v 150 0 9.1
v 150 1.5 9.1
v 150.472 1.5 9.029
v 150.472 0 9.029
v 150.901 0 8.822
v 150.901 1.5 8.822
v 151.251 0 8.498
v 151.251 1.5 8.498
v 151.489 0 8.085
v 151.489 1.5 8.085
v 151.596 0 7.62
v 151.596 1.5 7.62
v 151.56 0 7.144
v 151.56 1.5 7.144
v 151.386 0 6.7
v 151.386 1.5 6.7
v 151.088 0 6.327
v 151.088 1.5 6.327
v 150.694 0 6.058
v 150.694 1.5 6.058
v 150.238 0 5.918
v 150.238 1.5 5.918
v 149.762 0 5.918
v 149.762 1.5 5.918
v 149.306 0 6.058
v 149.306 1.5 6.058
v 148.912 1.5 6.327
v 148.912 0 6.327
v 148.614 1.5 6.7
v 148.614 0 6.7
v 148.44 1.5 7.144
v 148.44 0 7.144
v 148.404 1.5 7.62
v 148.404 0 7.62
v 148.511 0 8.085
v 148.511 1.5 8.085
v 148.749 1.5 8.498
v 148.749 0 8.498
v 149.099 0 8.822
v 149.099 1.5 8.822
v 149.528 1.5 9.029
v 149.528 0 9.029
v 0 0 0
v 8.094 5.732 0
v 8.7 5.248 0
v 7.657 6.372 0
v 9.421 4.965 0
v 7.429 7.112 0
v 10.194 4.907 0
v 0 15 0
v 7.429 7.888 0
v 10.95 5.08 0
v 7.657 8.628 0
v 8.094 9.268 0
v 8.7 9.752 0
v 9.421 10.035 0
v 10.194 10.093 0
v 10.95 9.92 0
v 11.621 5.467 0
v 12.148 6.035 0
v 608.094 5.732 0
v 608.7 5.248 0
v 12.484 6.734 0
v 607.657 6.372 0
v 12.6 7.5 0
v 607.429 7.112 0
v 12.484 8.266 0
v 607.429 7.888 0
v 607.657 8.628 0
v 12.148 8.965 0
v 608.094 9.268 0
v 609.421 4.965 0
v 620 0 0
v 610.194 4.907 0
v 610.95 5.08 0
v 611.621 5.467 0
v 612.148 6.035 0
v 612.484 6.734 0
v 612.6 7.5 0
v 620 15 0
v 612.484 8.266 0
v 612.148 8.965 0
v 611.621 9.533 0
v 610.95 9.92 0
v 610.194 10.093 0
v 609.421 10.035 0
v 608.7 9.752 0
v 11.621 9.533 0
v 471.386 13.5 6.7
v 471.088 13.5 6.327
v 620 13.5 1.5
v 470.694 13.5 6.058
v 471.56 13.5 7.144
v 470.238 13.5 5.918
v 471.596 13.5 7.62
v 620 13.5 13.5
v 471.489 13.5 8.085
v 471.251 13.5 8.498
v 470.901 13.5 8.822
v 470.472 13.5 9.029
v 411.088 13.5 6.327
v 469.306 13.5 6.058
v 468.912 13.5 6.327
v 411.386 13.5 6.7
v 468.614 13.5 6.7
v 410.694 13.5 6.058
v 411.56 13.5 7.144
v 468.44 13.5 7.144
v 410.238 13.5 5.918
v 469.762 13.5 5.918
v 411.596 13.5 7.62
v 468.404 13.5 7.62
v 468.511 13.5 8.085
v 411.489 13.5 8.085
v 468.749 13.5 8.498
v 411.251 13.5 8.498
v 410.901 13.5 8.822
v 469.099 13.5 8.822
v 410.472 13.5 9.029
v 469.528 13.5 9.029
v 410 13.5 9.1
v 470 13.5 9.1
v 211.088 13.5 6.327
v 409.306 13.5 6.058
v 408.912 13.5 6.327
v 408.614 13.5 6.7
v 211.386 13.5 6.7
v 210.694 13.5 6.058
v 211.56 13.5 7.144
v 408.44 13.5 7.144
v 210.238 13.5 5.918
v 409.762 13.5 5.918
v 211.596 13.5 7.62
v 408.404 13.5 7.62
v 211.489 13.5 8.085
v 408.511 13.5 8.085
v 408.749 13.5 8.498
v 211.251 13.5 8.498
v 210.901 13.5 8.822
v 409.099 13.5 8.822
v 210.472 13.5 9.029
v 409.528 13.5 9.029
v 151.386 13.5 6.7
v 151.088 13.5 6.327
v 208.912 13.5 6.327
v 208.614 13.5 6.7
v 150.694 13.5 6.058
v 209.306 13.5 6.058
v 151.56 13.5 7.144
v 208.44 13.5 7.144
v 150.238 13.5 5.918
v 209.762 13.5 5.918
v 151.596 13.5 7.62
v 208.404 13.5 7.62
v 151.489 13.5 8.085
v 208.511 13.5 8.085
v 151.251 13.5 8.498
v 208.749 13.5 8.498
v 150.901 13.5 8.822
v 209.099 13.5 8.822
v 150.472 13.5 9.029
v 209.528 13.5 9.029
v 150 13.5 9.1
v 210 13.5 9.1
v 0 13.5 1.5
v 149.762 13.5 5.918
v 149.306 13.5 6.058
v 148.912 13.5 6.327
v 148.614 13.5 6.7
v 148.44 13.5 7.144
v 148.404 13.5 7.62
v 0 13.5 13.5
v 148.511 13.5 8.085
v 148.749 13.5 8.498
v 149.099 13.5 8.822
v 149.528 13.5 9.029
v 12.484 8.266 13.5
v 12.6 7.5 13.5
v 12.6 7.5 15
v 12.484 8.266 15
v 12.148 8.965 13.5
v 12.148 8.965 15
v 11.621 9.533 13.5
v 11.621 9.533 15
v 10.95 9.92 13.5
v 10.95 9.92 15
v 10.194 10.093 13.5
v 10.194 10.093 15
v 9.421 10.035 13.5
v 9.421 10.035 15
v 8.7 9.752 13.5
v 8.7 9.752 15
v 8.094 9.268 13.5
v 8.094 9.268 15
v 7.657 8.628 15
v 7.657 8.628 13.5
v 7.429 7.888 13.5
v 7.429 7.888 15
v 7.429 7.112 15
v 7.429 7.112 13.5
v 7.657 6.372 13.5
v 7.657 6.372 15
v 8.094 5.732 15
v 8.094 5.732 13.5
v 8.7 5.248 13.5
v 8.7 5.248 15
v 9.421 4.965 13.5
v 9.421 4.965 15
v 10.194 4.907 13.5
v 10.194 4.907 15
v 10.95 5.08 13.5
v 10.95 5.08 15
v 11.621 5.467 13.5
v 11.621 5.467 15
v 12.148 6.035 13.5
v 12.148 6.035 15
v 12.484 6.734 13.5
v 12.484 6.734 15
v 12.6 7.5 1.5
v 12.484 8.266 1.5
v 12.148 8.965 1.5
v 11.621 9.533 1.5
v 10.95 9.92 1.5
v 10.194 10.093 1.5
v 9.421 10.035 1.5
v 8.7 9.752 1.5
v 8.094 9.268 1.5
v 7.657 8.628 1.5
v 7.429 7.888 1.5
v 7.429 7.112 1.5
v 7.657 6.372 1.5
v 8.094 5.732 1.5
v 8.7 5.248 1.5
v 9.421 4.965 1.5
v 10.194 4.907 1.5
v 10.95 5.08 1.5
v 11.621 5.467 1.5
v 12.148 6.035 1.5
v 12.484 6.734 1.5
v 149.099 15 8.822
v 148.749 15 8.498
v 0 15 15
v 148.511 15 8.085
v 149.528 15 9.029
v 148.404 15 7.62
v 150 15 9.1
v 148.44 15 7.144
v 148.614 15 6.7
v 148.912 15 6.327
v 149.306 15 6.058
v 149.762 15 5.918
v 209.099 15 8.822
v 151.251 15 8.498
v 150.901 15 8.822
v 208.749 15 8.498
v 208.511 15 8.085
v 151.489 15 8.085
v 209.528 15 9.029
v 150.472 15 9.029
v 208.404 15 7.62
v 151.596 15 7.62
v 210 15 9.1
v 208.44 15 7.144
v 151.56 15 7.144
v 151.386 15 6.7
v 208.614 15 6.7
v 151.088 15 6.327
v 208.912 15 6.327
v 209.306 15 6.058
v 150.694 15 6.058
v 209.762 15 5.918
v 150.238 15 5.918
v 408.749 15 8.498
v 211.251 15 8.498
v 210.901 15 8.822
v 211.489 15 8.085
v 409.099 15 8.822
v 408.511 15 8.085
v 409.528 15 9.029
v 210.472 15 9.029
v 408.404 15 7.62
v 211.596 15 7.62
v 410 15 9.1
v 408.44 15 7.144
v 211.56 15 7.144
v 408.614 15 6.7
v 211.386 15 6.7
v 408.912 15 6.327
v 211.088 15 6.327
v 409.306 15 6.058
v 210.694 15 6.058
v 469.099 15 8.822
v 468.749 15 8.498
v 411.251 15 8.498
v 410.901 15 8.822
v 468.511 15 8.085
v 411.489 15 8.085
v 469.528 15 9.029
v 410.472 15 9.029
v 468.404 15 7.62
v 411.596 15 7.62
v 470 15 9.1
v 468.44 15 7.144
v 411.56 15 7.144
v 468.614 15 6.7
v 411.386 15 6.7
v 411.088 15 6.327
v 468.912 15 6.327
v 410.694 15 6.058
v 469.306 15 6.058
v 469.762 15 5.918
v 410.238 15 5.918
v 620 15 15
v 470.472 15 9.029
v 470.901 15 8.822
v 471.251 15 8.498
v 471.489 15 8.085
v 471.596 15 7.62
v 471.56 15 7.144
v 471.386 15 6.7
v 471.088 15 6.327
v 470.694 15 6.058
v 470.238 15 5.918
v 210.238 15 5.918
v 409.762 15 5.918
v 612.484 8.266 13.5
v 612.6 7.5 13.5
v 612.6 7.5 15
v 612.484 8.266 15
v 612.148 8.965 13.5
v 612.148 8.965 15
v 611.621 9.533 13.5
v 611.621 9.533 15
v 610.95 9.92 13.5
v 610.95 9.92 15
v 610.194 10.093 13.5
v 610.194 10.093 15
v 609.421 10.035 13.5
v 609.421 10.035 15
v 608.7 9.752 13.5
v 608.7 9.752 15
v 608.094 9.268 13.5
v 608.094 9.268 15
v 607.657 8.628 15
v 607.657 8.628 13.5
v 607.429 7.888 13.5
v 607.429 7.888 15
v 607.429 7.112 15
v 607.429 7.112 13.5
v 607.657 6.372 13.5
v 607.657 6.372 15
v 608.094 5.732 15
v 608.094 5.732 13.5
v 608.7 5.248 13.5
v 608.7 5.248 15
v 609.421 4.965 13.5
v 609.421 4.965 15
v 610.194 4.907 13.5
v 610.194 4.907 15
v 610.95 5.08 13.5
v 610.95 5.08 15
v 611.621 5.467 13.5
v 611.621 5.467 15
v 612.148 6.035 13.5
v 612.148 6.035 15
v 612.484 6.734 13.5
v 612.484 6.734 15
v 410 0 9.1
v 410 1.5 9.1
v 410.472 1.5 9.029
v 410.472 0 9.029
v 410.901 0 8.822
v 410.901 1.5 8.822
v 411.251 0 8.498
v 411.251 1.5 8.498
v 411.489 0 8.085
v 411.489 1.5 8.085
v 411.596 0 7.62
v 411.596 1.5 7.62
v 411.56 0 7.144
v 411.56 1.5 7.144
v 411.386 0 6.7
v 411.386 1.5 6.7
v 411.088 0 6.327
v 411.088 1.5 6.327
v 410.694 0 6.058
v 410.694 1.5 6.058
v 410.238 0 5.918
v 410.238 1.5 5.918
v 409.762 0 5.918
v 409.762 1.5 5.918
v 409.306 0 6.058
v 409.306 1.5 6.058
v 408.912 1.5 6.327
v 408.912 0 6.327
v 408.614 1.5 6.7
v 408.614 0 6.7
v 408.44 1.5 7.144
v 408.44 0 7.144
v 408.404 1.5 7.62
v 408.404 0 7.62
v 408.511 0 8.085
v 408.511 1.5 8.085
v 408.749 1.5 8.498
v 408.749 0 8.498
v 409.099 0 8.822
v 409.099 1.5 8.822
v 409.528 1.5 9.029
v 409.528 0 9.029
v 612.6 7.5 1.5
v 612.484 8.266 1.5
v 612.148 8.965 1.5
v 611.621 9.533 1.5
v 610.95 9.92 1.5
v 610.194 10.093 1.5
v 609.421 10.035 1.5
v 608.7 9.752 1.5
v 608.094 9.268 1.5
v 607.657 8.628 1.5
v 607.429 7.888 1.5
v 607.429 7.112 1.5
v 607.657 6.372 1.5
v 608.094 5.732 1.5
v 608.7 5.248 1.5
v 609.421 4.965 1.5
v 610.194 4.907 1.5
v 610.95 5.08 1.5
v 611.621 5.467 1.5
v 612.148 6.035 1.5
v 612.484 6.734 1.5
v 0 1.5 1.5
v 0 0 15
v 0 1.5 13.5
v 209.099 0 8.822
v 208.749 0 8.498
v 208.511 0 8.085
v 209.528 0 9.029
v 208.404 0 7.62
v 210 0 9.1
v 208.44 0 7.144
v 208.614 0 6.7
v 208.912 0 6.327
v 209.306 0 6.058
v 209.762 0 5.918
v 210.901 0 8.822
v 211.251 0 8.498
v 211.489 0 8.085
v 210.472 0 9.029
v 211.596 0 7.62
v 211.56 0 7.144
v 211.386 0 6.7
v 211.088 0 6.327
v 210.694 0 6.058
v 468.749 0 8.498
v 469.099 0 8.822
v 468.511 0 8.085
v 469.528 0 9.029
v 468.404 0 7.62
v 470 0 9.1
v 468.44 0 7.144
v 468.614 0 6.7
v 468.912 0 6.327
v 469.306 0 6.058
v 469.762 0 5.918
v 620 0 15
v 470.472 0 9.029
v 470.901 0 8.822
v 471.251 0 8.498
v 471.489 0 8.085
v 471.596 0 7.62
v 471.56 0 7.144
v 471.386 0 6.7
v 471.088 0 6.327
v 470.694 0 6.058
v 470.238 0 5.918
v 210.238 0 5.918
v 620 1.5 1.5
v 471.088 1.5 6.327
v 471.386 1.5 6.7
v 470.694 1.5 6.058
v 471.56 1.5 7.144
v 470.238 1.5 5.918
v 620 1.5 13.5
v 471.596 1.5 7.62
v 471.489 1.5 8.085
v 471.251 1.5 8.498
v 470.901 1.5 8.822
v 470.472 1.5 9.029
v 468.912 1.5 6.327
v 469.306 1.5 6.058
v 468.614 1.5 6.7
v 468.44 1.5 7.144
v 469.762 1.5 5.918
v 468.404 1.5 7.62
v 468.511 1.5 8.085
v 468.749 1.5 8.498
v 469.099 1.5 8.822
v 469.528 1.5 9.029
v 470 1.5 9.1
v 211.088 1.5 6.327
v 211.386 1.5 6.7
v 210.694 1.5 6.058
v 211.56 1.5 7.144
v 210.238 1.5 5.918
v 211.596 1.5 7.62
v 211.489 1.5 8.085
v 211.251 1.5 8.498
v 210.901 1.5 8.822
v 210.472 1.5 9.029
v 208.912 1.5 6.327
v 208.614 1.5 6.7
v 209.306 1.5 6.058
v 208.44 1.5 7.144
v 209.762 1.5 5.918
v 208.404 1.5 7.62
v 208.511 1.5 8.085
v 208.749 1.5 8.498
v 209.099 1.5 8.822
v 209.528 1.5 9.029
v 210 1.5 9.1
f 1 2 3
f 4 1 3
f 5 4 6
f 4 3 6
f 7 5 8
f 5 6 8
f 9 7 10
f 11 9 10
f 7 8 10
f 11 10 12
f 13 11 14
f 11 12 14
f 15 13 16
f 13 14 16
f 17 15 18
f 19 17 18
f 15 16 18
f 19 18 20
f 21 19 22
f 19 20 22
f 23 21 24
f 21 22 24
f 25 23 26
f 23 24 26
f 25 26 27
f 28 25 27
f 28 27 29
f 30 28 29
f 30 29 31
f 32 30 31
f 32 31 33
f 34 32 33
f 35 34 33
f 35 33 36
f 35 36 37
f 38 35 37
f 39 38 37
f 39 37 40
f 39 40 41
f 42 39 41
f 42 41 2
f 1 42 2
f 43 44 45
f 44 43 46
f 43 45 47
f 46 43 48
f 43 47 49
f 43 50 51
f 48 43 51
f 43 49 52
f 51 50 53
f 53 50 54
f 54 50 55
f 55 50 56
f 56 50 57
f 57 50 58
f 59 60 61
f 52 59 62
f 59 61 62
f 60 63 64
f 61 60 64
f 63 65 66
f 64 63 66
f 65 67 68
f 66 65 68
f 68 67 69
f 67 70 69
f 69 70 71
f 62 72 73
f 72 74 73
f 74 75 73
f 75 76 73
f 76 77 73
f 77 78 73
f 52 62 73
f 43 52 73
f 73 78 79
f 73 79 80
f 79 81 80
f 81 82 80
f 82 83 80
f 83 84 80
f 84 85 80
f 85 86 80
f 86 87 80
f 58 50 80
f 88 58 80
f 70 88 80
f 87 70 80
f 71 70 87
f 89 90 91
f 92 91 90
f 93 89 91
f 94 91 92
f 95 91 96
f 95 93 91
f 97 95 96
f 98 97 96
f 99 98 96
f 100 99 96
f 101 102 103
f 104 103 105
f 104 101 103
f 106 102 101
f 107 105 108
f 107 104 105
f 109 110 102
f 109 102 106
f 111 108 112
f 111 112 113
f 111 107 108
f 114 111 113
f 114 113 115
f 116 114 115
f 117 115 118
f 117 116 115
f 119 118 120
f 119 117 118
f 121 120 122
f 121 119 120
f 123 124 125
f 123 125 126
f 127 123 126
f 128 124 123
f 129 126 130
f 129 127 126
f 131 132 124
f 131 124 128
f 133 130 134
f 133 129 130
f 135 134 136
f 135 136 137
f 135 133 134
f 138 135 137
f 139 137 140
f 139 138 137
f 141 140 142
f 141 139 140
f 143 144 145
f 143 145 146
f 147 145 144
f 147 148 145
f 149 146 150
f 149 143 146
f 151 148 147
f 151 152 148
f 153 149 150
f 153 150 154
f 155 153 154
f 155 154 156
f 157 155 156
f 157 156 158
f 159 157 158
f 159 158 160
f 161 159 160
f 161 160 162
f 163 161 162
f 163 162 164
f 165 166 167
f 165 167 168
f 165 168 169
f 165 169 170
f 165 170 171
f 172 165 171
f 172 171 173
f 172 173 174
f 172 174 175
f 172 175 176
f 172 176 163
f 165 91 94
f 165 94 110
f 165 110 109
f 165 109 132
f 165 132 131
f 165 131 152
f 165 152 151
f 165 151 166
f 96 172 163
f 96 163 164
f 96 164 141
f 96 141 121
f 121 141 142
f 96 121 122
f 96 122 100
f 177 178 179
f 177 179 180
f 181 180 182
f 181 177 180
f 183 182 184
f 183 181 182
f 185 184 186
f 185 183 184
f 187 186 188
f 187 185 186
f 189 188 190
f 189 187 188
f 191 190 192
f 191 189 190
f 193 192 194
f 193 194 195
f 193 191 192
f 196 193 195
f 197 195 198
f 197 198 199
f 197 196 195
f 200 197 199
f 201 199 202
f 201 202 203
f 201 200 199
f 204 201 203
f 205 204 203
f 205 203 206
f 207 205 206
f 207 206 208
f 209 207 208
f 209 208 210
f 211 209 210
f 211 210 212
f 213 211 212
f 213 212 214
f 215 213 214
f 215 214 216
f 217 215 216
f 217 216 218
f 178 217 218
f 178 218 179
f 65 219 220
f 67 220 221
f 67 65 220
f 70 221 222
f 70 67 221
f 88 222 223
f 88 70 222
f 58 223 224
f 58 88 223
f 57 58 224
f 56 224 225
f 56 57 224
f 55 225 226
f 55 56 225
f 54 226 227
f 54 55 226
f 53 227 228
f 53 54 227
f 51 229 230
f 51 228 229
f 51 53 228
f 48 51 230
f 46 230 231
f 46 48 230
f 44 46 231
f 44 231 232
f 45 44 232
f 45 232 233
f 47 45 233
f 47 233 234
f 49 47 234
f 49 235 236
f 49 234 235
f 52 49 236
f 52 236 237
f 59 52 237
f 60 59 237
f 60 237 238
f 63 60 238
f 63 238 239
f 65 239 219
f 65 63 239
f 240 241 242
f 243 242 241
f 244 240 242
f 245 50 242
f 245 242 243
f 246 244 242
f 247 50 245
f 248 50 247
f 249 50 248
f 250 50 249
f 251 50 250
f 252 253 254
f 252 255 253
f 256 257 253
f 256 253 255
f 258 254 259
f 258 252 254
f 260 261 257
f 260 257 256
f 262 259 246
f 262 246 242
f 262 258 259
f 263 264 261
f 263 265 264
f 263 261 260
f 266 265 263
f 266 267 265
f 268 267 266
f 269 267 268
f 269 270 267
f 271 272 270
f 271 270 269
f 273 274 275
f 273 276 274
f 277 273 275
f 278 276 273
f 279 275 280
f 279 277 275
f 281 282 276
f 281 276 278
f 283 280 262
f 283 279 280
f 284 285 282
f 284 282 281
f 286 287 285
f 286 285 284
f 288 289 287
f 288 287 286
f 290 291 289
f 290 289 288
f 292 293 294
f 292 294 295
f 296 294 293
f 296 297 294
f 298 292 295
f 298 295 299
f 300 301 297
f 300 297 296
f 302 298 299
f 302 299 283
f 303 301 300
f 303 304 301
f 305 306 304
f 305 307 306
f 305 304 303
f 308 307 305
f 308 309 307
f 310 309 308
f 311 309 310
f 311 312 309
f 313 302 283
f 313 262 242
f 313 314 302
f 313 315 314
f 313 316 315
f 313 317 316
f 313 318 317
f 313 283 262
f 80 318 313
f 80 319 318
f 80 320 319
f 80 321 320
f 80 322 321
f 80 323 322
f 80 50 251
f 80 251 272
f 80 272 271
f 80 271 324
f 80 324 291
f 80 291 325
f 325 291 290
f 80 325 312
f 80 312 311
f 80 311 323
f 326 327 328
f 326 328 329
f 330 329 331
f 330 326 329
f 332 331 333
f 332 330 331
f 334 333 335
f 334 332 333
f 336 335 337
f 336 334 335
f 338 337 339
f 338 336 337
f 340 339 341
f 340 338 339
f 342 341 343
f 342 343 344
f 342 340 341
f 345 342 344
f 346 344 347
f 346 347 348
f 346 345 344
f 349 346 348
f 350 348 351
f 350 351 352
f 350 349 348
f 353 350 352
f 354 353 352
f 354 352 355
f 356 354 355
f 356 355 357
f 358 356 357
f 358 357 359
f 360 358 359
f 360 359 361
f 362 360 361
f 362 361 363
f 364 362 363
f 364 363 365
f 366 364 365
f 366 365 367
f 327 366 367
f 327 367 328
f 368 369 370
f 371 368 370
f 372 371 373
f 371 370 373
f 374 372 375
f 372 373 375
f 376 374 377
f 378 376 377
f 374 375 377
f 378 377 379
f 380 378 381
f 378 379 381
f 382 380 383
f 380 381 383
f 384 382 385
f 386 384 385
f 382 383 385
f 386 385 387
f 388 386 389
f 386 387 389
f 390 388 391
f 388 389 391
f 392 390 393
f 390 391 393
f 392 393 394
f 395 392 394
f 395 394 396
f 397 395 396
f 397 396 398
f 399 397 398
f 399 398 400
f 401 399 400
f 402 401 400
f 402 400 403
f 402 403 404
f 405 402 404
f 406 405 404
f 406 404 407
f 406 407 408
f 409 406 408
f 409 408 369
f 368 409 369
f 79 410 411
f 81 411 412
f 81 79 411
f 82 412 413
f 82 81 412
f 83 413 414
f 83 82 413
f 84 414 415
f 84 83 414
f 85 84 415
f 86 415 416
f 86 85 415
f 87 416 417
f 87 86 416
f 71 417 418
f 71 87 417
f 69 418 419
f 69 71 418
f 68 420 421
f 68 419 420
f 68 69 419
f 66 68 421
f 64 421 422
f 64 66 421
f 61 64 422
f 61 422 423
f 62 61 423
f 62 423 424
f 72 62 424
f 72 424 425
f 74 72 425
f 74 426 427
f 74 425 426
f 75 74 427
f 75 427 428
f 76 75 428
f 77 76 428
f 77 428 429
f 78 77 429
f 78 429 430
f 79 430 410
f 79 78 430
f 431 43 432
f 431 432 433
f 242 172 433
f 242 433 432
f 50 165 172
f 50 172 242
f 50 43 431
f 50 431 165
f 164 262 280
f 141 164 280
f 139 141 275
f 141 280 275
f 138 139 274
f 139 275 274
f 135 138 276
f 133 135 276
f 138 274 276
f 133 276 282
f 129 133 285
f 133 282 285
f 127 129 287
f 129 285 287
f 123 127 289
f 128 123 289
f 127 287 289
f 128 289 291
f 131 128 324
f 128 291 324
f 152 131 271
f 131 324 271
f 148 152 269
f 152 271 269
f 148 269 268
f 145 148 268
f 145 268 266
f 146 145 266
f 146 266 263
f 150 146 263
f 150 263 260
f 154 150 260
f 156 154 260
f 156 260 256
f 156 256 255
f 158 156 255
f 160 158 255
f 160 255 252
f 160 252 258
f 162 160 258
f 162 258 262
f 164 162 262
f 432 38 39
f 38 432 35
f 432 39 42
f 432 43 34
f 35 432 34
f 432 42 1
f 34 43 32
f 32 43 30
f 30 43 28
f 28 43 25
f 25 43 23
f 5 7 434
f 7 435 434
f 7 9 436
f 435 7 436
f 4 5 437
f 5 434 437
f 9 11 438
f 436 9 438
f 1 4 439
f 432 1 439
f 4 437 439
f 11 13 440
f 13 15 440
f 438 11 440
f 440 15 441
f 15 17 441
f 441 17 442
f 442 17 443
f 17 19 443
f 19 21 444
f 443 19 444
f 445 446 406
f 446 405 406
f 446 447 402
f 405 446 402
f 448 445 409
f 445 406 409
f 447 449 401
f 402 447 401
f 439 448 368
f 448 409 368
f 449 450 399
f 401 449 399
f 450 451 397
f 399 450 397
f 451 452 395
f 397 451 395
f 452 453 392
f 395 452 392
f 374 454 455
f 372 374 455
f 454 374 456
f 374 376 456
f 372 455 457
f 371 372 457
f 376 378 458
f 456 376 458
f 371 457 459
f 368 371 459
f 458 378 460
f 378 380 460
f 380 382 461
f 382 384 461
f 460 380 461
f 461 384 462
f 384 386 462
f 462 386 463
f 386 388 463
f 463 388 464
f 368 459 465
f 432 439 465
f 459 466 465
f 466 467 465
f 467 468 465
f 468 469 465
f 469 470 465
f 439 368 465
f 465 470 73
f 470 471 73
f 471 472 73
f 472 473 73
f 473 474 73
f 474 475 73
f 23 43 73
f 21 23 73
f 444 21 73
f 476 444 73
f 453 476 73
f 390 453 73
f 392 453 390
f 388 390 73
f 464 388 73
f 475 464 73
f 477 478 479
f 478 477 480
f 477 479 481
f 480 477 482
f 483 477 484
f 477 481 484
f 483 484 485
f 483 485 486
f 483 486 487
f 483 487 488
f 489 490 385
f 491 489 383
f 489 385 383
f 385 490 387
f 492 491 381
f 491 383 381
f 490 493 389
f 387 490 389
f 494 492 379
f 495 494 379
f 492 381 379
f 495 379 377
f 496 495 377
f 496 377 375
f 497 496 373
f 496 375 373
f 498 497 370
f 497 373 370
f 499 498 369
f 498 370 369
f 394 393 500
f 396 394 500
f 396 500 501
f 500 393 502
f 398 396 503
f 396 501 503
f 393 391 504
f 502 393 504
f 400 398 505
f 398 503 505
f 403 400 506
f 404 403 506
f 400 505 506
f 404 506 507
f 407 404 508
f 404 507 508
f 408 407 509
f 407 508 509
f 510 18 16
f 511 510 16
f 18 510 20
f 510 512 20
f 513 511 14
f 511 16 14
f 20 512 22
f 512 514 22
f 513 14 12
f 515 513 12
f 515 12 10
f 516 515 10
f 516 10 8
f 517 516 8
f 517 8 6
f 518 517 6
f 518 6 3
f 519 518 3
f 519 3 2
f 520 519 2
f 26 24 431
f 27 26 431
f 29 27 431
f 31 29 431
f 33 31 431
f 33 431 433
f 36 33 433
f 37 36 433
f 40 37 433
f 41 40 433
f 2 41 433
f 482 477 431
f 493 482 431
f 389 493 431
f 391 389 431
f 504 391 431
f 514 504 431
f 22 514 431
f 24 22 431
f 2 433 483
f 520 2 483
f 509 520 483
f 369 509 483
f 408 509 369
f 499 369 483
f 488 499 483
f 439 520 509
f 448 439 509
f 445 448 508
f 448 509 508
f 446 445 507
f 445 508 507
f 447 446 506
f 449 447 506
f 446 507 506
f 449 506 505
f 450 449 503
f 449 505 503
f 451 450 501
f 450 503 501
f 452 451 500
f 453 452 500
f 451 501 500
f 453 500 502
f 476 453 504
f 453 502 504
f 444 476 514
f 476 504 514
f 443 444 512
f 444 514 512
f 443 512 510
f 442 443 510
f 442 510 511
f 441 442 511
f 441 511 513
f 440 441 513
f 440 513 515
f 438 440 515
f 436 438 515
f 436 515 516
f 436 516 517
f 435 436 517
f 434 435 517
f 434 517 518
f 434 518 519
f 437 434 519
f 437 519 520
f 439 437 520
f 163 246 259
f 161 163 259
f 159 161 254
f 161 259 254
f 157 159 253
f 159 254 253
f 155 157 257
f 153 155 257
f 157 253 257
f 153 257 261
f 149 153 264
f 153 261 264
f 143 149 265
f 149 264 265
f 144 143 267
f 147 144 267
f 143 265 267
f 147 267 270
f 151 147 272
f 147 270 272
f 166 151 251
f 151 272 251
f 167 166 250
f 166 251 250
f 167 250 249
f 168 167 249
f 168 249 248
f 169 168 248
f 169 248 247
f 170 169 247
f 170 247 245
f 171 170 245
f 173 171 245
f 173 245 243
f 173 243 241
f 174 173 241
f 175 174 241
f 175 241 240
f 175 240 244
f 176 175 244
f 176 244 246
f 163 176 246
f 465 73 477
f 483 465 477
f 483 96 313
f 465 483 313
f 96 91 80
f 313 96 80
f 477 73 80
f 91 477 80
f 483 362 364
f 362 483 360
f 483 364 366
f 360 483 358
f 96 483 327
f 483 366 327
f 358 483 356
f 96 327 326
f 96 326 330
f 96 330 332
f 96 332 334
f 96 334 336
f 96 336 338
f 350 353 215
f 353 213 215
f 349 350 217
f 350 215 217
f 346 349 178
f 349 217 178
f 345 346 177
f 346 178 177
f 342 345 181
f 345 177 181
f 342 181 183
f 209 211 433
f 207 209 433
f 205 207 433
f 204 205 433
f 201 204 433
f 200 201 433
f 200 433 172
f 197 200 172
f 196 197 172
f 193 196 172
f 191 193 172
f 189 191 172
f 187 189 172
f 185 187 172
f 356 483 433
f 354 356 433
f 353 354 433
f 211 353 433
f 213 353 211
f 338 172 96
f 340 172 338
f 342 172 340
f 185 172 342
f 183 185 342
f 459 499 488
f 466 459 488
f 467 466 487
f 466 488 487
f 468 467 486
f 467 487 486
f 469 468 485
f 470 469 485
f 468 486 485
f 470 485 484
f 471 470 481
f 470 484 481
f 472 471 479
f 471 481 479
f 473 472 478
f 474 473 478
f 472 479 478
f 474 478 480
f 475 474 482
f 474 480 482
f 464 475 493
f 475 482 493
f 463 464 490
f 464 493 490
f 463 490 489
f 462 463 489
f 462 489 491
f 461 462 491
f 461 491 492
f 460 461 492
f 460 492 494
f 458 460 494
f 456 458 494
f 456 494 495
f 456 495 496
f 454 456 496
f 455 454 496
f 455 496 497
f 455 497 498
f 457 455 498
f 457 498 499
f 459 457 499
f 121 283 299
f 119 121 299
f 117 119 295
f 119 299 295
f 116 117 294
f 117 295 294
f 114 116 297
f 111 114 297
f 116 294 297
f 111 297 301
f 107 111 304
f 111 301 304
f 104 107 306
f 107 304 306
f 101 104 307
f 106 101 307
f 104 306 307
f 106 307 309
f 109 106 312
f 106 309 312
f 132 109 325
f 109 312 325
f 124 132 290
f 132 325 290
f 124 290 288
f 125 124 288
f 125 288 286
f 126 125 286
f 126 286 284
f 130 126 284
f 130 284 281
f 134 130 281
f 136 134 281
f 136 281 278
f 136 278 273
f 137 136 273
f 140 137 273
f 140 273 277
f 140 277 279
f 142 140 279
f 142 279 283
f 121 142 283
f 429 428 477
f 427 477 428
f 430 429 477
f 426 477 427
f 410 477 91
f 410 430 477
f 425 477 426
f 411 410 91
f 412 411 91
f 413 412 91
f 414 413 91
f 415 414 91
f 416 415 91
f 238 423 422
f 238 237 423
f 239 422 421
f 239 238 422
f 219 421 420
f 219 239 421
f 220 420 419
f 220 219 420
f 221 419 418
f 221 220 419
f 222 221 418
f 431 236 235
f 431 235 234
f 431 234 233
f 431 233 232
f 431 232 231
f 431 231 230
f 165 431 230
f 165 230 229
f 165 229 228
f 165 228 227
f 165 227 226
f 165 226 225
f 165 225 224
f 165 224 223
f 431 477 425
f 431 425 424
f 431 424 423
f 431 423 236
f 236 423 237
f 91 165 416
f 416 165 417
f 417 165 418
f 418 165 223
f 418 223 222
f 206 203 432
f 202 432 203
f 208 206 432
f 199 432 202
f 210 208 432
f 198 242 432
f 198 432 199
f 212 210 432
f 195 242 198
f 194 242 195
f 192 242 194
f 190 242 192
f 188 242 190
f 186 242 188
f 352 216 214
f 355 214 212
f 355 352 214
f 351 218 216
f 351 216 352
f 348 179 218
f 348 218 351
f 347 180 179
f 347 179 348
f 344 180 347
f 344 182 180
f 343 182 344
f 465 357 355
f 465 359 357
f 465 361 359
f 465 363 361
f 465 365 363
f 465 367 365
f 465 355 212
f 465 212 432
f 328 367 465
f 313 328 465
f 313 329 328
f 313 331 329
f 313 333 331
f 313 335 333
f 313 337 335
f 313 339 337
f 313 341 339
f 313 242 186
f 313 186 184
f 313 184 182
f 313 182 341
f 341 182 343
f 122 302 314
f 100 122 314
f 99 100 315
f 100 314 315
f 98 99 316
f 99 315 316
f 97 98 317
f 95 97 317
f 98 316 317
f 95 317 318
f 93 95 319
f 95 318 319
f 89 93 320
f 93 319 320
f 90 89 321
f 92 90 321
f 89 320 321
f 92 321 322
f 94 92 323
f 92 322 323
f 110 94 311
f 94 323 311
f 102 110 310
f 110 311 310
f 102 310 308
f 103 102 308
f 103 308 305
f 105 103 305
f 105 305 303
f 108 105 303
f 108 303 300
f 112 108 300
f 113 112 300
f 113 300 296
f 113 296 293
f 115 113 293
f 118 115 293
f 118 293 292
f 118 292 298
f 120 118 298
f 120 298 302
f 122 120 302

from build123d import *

# Parameters (mm, degrees)
SKETCH_2_W          = 620
SKETCH_2_H          = 15
SKETCH_2_R          = 2.6
EXTRUDE_1_DEPTH     = 15
SKETCH_3_W          = 12
SKETCH_3_H          = 12
CUT_EXTRUDE_1_DEPTH = 621.362797079
SKETCH_4_R          = 1.6
CUT_EXTRUDE_2_DEPTH = 621.362797079


with BuildPart() as part:
    # ｽｹｯﾁ2 → ﾎﾞｽ - 押し出し1 (new body)
    with BuildSketch(Plane.XY):
        with Locations((310, 7.5)):
            Rectangle(SKETCH_2_W, SKETCH_2_H)
        with Locations((10, 7.5)):
            Circle(SKETCH_2_R, mode=Mode.SUBTRACT)
        with Locations((610, 7.5)):
            Circle(SKETCH_2_R, mode=Mode.SUBTRACT)
    extrude(amount=EXTRUDE_1_DEPTH)

    # ｽｹｯﾁ3 → ｶｯﾄ - 押し出し1 (cut, through all)
    with BuildSketch(Plane.ZY):
        with Locations((7.5, 7.5)):
            Rectangle(SKETCH_3_W, SKETCH_3_H)
    extrude(amount=-CUT_EXTRUDE_1_DEPTH, mode=Mode.SUBTRACT)

    # ｽｹｯﾁ4 → ｶｯﾄ - 押し出し2 (cut, through all)
    with BuildSketch(Plane(origin=(0, 15, 0), x_dir=(1, 0, 0), z_dir=(0, 1, 0))):
        with Locations(Location((470, -7.5, 0), (0, 0, 270))):
            Circle(SKETCH_4_R)
        with Locations(Location((410, -7.5, 0), (0, 0, 270))):
            Circle(SKETCH_4_R)
        with Locations(Location((150, -7.5, 0), (0, 0, 270))):
            Circle(SKETCH_4_R)
        with Locations(Location((210, -7.5, 0), (0, 0, 270))):
            Circle(SKETCH_4_R)
    extrude(amount=-CUT_EXTRUDE_2_DEPTH, mode=Mode.SUBTRACT)


solid = part.part
